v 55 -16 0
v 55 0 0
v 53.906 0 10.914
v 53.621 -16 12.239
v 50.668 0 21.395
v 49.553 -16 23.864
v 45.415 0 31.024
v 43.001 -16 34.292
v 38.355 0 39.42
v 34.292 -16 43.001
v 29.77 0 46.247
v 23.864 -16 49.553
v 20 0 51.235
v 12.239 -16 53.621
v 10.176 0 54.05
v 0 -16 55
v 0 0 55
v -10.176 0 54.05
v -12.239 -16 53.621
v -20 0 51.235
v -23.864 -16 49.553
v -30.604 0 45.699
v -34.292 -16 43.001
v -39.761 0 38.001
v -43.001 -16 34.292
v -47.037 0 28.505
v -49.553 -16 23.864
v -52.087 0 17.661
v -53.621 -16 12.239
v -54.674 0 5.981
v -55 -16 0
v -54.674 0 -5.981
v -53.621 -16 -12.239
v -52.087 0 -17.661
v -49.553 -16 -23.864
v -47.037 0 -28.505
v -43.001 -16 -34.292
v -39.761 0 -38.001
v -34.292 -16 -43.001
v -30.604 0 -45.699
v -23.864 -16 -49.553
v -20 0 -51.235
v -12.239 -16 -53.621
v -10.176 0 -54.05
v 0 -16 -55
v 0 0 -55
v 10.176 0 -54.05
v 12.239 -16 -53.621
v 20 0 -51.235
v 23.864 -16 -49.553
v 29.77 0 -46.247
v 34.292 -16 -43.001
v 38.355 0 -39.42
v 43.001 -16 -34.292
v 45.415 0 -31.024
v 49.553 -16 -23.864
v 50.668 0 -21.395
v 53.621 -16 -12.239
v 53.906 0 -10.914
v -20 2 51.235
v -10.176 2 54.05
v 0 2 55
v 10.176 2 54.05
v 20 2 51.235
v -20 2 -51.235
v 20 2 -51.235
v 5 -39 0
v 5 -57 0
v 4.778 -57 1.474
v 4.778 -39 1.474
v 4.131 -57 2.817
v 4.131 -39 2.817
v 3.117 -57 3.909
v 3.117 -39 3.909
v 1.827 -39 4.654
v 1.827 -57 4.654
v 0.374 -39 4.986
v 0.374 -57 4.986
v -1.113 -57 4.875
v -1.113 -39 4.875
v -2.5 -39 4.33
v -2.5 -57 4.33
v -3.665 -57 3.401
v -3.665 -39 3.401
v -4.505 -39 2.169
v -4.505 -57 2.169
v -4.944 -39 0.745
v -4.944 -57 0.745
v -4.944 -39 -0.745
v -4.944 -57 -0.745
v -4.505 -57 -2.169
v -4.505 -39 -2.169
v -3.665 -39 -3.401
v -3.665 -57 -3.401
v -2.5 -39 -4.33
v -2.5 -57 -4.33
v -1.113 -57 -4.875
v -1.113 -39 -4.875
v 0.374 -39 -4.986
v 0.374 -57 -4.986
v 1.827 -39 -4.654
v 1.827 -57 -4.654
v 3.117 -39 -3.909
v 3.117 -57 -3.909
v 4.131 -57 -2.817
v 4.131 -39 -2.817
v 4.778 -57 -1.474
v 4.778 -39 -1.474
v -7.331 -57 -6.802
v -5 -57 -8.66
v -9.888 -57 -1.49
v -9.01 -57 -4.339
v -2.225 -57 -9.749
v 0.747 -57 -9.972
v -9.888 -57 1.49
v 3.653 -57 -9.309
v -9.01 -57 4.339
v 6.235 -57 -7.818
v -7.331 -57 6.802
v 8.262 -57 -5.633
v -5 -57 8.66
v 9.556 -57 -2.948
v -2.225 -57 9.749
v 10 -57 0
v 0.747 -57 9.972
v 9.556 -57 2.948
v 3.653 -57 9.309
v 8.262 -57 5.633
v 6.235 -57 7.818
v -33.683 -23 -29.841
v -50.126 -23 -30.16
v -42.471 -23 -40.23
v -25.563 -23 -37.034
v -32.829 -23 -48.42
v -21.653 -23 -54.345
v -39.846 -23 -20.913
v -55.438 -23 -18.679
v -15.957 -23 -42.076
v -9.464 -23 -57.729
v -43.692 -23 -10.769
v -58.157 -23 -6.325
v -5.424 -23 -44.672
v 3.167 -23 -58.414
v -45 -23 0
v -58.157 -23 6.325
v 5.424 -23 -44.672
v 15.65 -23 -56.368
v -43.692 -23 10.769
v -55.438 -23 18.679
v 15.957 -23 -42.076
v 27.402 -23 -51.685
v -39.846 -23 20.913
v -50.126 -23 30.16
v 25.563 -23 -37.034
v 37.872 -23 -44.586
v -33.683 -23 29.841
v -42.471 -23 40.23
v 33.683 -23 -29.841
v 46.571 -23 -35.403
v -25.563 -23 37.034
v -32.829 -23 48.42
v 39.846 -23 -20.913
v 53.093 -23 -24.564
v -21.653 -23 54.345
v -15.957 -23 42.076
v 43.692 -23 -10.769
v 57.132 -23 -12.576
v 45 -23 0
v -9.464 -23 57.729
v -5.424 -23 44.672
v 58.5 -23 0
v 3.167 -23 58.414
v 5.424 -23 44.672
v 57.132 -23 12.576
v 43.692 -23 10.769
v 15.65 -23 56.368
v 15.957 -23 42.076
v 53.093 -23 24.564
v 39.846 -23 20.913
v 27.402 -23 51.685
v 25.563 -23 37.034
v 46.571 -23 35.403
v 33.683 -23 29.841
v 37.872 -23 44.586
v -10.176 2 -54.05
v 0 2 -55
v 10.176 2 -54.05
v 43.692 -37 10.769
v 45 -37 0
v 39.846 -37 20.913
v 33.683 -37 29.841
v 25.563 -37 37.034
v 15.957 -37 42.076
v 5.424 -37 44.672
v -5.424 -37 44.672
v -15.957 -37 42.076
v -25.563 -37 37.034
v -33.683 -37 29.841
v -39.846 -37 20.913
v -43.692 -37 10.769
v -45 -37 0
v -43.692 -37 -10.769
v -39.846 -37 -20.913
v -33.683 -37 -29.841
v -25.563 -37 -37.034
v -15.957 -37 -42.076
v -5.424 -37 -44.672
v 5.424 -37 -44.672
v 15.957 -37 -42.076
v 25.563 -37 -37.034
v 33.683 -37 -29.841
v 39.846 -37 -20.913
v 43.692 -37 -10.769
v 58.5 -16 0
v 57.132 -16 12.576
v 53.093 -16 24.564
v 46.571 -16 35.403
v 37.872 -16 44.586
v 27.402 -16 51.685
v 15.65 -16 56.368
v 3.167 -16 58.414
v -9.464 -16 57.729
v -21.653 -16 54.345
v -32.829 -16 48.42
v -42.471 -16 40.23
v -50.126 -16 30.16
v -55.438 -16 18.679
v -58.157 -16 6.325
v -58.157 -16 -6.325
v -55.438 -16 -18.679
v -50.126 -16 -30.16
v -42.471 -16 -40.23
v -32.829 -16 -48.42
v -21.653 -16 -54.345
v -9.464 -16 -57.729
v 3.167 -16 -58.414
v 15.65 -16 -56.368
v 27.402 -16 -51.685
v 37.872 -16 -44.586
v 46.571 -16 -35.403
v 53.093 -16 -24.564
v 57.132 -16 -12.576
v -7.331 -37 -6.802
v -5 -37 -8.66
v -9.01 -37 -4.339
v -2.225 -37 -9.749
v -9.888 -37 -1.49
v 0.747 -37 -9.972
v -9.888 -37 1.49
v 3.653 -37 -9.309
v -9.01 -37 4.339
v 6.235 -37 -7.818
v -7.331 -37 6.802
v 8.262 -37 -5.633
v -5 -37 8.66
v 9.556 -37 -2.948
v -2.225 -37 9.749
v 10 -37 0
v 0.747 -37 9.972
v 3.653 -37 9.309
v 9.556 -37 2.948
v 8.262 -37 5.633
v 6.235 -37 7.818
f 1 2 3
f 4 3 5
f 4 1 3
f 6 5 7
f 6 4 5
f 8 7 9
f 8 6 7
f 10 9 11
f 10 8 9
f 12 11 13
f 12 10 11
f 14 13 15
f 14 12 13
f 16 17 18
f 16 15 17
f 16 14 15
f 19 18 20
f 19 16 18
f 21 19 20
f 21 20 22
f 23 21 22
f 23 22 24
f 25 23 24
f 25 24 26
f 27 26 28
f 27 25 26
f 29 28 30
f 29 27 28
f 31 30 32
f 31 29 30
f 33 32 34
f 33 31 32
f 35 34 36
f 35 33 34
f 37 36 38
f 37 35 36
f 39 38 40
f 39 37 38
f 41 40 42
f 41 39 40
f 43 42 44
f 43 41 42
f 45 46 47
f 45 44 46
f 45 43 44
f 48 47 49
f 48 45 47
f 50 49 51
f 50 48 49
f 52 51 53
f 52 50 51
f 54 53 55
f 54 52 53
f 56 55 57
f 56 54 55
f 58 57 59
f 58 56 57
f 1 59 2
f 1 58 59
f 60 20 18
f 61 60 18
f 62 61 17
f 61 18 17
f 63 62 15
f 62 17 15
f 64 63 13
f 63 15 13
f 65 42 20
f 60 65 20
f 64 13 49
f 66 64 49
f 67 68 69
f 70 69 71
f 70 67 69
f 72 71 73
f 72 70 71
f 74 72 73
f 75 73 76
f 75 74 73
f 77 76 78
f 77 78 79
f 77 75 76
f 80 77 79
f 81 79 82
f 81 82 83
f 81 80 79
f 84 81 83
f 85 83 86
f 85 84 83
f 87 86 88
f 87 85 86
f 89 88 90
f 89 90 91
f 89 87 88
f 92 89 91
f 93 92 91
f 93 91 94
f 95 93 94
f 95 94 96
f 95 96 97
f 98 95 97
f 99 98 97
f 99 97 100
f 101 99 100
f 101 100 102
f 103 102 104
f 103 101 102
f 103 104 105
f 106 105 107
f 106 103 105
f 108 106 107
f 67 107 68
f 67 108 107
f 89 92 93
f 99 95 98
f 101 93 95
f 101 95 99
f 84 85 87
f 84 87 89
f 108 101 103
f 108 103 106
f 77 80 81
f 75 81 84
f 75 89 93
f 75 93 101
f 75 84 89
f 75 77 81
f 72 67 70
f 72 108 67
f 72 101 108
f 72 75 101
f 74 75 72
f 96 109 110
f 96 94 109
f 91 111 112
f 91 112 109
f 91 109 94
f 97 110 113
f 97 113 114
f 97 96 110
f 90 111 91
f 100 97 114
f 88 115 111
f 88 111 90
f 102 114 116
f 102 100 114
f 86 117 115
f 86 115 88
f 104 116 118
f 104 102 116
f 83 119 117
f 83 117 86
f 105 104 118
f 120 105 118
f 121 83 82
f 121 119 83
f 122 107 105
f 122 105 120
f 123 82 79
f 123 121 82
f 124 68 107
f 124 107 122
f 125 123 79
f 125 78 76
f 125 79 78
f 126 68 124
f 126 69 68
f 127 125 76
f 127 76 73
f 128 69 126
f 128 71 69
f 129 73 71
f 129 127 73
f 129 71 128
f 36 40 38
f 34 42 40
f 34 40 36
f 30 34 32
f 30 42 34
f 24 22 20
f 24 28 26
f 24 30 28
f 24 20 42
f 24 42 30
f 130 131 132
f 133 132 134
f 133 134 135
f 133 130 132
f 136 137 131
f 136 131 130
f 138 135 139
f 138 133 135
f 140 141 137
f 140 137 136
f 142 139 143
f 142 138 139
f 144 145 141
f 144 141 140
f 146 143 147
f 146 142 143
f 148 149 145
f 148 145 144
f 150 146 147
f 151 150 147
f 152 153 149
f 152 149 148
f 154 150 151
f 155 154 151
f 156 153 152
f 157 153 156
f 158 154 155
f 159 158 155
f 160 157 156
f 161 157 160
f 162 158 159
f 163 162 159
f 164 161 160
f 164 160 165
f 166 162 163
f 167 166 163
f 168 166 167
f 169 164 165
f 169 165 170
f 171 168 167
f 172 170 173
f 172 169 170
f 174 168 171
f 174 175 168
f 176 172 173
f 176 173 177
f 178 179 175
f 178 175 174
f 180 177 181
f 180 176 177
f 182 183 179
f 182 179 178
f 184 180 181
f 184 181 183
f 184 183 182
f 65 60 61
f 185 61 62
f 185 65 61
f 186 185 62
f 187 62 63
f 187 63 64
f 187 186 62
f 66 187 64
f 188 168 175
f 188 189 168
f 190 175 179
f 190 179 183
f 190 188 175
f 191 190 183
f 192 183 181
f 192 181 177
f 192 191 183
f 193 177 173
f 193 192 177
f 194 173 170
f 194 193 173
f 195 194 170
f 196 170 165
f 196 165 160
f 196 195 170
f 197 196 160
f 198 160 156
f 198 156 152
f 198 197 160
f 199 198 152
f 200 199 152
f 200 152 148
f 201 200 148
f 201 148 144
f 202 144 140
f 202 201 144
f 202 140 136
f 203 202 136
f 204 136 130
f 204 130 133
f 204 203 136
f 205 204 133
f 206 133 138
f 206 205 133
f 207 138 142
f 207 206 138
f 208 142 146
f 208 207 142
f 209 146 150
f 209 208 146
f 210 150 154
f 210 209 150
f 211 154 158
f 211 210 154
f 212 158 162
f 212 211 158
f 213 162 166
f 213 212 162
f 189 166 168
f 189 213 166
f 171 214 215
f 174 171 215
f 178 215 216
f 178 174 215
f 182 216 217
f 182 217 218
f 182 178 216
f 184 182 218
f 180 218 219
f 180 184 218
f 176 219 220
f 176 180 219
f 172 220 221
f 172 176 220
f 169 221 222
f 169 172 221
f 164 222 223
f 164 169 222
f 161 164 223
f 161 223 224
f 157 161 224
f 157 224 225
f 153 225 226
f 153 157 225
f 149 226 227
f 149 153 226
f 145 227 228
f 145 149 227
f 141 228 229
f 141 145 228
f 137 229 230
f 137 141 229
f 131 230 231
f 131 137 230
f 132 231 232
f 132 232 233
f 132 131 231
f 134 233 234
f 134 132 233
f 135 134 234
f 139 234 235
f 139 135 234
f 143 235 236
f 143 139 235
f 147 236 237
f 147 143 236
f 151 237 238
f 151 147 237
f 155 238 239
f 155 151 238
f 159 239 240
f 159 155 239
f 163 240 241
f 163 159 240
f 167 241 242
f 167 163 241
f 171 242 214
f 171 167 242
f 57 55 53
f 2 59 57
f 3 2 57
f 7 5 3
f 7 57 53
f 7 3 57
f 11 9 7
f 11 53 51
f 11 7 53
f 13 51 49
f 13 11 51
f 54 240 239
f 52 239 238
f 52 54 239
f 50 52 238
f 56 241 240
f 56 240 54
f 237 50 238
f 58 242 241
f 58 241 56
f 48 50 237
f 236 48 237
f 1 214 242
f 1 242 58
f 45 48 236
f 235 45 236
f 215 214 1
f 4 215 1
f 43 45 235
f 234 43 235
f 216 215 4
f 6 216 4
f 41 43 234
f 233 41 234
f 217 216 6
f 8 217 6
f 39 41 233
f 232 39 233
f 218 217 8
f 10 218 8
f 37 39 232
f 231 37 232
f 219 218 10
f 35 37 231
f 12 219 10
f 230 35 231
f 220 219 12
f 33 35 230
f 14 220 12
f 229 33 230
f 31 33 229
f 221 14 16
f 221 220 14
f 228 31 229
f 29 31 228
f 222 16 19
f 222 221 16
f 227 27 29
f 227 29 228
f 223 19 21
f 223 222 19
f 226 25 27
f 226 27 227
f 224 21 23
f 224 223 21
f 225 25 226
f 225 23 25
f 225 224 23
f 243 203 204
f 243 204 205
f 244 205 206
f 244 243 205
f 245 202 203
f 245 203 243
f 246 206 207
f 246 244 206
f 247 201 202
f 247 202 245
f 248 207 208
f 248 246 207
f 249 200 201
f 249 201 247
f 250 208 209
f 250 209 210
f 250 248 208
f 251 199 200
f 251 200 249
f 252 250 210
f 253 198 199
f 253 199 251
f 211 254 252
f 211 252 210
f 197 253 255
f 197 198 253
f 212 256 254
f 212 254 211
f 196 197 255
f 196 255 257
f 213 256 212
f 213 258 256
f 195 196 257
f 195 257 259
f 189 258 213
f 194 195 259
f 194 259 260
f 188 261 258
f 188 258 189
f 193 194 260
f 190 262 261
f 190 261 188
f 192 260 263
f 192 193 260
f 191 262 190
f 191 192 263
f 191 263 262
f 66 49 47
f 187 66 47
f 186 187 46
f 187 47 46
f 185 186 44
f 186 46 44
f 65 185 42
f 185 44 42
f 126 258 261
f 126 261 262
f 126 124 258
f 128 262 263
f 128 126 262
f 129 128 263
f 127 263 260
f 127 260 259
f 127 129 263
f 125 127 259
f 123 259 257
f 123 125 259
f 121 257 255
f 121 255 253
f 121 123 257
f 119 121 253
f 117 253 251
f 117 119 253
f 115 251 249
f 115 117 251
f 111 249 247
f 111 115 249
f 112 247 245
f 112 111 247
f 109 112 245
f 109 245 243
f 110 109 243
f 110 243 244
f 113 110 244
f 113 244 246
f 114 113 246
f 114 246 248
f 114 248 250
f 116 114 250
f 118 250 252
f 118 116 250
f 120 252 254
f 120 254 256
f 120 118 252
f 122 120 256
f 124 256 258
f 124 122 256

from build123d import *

# Parameters (mm, degrees)
EXTRUDE_1_DEPTH = 2


with BuildPart() as part:
    # 草圖1 → 旋轉1 (revolve)
    with BuildSketch(Plane.XY):
        Polygon((0, 0), (55, 0), (55, -16), (58.5, -16), (58.5, -23), (45, -23), (45, -37), (10, -37), (10, -57), (5, -57), (5, -39), (0, -39), align=None)
    revolve(axis=Axis((0, 84.440513305, 0), (0, -1, 0)))

    # 草圖3 → 填料-伸長1 (add)
    with BuildSketch(Plane(origin=(0, 0, 0), x_dir=(1, 0, 0), z_dir=(0, 1, 0))):
        with BuildLine():
            Line((-20, 51.23475383), (-20, -51.23475383))
            ThreePointArc((-20, -51.23475383), (0, -55), (20, -51.23475383))
            Line((20, -51.23475383), (20, 51.23475383))
            ThreePointArc((20, 51.23475383), (0, 55), (-20, 51.23475383))
        make_face()
    extrude(amount=EXTRUDE_1_DEPTH)


solid = part.part
